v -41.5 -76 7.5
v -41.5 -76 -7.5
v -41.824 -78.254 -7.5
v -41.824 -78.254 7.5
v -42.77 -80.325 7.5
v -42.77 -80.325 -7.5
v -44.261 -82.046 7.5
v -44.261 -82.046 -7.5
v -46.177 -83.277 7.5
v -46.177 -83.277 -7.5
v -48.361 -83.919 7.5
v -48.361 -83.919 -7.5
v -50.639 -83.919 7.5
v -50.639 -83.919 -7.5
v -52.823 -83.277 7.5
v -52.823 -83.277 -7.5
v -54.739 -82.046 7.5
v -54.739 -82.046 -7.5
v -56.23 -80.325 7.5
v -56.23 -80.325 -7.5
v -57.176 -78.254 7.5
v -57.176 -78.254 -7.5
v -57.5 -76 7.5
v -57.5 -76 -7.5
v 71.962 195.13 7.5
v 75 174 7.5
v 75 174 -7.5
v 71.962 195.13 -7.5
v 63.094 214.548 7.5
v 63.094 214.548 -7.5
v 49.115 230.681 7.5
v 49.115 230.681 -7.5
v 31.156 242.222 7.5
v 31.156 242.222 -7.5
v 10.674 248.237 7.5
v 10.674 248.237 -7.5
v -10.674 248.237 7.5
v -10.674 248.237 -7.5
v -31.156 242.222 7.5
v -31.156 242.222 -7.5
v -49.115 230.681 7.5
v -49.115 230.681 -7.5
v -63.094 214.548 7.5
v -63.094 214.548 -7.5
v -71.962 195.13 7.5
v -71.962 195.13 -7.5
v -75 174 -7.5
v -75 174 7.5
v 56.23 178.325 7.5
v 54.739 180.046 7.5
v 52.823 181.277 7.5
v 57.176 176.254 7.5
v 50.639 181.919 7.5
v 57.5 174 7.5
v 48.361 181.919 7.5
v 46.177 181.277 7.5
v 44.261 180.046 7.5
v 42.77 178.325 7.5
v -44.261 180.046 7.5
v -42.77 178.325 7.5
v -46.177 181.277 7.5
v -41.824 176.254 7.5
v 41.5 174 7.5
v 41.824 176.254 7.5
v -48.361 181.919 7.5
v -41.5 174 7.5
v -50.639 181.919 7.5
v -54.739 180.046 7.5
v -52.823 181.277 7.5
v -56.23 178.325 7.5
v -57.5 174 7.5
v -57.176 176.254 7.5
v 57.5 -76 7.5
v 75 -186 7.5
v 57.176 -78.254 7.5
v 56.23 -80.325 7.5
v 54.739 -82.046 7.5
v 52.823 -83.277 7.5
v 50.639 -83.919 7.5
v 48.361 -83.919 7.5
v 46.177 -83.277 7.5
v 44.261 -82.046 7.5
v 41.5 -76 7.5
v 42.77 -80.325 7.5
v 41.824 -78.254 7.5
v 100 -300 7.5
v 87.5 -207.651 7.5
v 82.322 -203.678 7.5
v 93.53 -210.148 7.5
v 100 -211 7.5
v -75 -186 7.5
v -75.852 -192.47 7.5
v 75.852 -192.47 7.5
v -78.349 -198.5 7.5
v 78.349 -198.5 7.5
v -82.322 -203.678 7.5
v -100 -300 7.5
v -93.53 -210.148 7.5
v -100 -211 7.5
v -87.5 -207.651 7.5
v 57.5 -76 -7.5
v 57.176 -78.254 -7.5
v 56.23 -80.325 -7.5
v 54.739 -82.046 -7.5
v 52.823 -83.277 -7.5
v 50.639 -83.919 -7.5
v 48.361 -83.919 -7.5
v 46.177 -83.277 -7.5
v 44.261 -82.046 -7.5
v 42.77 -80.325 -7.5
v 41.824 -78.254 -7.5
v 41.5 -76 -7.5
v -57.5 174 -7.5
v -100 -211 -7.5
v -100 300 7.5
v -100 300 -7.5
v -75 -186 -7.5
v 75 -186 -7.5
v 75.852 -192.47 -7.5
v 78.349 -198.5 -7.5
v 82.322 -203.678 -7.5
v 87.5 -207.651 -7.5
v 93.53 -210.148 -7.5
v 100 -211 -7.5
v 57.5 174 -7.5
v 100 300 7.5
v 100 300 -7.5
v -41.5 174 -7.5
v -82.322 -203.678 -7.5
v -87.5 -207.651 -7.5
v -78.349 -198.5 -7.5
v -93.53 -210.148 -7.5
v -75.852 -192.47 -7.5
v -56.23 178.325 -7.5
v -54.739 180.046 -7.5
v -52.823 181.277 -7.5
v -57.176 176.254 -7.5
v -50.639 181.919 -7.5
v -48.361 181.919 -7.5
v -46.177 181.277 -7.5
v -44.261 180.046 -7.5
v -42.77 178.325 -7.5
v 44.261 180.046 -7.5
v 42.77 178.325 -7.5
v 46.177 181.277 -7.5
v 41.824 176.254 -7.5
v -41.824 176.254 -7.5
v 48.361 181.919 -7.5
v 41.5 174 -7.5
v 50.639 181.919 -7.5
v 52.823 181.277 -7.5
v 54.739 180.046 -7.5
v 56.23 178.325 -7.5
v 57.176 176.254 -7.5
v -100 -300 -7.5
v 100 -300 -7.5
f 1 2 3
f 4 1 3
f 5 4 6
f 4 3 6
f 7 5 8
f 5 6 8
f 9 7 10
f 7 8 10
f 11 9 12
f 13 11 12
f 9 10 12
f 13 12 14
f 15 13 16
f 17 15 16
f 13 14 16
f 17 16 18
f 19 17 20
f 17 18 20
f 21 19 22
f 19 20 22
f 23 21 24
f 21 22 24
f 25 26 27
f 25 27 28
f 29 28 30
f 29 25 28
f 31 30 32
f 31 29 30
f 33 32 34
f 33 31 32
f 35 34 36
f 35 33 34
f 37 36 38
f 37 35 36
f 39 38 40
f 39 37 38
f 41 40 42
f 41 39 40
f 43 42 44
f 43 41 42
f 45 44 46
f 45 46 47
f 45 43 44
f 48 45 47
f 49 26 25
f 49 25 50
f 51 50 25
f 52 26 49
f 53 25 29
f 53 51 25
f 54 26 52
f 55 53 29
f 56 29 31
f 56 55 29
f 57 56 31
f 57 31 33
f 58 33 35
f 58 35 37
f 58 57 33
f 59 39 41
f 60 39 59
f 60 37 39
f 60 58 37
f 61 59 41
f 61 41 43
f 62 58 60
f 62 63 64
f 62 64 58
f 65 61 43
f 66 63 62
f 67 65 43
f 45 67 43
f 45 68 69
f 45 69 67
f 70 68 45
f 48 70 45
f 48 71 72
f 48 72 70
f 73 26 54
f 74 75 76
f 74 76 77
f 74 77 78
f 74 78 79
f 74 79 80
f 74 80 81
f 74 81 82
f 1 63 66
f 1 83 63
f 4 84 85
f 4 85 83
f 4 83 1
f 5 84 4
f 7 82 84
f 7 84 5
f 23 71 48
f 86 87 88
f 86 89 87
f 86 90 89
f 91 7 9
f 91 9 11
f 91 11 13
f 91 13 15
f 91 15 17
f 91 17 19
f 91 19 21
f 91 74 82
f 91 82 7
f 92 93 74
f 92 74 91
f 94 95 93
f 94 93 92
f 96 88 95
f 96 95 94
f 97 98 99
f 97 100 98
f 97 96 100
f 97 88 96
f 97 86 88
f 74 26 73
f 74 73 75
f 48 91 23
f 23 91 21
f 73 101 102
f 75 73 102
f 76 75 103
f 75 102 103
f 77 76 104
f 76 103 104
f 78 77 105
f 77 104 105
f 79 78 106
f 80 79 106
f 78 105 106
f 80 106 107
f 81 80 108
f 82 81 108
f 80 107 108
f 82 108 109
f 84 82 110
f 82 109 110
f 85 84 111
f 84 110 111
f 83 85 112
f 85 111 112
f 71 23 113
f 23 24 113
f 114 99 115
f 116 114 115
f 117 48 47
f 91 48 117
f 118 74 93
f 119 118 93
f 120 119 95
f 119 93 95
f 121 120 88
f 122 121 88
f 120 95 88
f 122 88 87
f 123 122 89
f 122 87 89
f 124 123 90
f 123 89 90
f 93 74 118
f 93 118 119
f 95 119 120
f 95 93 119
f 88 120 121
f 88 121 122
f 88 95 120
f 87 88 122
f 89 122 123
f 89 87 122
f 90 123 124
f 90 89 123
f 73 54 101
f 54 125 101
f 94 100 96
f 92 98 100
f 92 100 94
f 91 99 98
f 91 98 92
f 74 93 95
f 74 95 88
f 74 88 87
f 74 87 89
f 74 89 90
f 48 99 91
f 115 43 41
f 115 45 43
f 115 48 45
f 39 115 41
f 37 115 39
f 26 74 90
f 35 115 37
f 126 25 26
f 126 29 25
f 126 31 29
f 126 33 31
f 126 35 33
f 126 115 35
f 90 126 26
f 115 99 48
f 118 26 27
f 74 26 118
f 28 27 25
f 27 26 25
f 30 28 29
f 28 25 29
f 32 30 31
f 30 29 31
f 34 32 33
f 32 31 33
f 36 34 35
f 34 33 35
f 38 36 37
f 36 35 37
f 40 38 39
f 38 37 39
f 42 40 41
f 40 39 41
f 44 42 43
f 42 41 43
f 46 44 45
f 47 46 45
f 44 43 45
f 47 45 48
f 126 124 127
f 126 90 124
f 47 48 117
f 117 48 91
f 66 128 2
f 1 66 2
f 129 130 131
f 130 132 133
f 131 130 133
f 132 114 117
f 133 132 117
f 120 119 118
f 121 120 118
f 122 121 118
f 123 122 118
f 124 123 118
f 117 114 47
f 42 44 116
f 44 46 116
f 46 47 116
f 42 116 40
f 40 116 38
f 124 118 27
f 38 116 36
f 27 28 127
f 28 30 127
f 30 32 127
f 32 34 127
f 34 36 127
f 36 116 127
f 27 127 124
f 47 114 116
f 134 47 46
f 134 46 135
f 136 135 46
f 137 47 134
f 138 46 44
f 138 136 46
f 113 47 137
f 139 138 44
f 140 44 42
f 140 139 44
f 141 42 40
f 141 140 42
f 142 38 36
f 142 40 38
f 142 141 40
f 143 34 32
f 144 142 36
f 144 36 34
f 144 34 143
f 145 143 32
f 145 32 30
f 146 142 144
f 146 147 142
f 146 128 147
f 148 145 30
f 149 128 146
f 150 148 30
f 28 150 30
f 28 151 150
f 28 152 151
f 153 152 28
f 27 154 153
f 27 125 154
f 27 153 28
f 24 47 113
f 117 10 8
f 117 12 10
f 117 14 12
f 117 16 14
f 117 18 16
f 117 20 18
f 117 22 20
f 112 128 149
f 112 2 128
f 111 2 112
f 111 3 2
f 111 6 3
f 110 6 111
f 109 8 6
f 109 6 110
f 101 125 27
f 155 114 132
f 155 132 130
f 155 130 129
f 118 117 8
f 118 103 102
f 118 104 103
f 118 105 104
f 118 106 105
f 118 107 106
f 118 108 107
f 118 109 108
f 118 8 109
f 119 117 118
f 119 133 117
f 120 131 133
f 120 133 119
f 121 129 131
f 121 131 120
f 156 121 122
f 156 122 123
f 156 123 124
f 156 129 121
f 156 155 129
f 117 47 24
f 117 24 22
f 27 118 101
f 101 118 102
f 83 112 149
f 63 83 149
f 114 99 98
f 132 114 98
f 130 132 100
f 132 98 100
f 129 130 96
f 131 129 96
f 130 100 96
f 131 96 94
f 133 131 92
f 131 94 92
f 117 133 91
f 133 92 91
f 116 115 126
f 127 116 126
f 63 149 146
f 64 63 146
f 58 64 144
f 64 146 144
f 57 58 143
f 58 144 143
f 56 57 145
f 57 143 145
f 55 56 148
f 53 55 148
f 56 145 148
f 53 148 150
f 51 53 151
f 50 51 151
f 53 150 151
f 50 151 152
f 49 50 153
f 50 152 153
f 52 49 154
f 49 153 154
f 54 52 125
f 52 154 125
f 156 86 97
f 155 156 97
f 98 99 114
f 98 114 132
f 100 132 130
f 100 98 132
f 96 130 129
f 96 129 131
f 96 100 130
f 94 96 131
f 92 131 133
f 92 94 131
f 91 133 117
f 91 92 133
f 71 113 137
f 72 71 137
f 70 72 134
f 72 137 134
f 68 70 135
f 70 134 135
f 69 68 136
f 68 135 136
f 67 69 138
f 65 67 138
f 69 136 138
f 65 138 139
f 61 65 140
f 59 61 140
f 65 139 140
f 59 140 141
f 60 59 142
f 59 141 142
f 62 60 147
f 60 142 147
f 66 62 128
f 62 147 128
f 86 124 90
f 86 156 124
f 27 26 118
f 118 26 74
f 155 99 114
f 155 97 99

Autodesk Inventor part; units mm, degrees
ref_plane "YZ Plane" through (0, 0, 0) normal (1, 0, 0) x (0, 1, 0)
ref_plane "XZ Plane" through (0, 0, 0) normal (0, 1, 0) x (-1, 0, 0)
ref_plane "XY Plane" through (0, 0, 0) normal (0, 0, 1) x (1, 0, 0)
sketch "Esboço1" plane through (0, 0, 0) normal (0, 1, 0) x (-1, 0, 0)
  line L0 (-100, 7.5) -> (100, 7.5)
  line L1 (100, 7.5) -> (100, -7.5)
  line L2 (100, -7.5) -> (-100, -7.5)
  line L3 (-100, -7.5) -> (-100, 7.5)
  line L4 (-100, 7.5) -> (100, -7.5) construction
  line L5 (100, 7.5) -> (-100, -7.5) construction
  point P0 (0, 0)
  dimension "d0" = 200
  dimension "d1" = 15
extrude "Extrusão1" add sketch "Esboço1" along normal mid plane 600
sketch "Esboço2" plane through (-100, 300, 7.5) normal (0, 0, 1) x (1, 0, 0)
  line L0 (0, 0) -> (200, 0) projected
  line L1 (100, 0) -> (100, 69.4125)
  line L2 (100, -51) -> (100, -126) construction
  line L3 (-27.4688, -551) -> (246.7453, -551) construction
  line L4 (200, -600) -> (0, -600) projected
  line L5 (25, -126) -> (25, -486)
  line L6 (175, -126) -> (175, -486)
  arc A0 (175, -126) -> (25, -126) centre (100, -126) ccw
  line L7 (200, -600) -> (200, 0) projected
  line L8 (0, -600) -> (0, 0) projected
  line L9 (0, -511) -> (25, -511) construction
  line L10 (175, -511) -> (200, -511) construction
  arc A1 (0, -511) -> (25, -486) centre (0, -486) ccw
  line L11 (25, -486) -> (25, -511) construction
  arc A2 (175, -486) -> (200, -511) centre (200, -486) ccw
  line L12 (175, -486) -> (175, -511) construction
  point P0 (100, -300)
  dimension "d7" = 49
  dimension "d9" = 150
  dimension "d10" = 500
  dimension "d11" = 40
extrude "Extrusão2" cut sketch "Esboço2" against normal up to surface (15 mm away) contours L0 L7 A2 L6 A0 L5 A1 L8
extrude "Extrusão3" add sketch "Esboço2" against normal up to surface (15 mm away) separate body contours L0 L7 A2 L6 A0 L5 A1 L8
sketch "Esboço3" plane through (100, -300, -7.5) normal (0, 0, -1) x (-1, 0, 0)
  arc A0 (58.5, 474) -> (42.5, 474) centre (50.5, 474) ccw
  arc A1 (157.5, 474) -> (141.5, 474) centre (149.5, 474) ccw
  line L0 (50.5, 474) -> (149.5, 474) construction
  arc A2 (175, 474) -> (25, 474) centre (100, 474) ccw projected
  line L1 (100, 474) -> (100, 578.5604) construction
  line L2 (100, 474) -> (100, 224) construction
  arc A3 (42.5, 224) -> (58.5, 224) centre (50.5, 224) ccw
  arc A4 (141.5, 224) -> (157.5, 224) centre (149.5, 224) ccw
  line L3 (50.5, 224) -> (149.5, 224) construction
  line L4 (42.5, 474) -> (42.5, 224)
  line L5 (58.5, 224) -> (58.5, 474)
  line L6 (141.5, 474) -> (141.5, 224)
  line L7 (157.5, 224) -> (157.5, 474)
  point P0 (100, 300)
  dimension "d16" = 16
  dimension "d17" = 16
  dimension "d18" = 99
  dimension "d19" = 16
  dimension "d20" = 16
  dimension "d21" = 99
  dimension "d22" = 250
extrude "Extrusão4" cut sketch "Esboço3" against normal up to surface (15 mm away)
sketch "Esboço4" plane through (-100, -300, 7.5) normal (0, 0, 1) x (1, 0, 0)
  arc A0 (141.5, 224) -> (157.5, 224) centre (149.5, 224) ccw projected
  arc A1 (157.5, 474) -> (141.5, 474) centre (149.5, 474) ccw projected
  line L0 (149.5, 224) -> (149.5, 474) construction
  line L1 (149.5, 349) -> (241.6244, 349) construction
  point P0 (100, 300)
properties part number "Painel Vertical"
